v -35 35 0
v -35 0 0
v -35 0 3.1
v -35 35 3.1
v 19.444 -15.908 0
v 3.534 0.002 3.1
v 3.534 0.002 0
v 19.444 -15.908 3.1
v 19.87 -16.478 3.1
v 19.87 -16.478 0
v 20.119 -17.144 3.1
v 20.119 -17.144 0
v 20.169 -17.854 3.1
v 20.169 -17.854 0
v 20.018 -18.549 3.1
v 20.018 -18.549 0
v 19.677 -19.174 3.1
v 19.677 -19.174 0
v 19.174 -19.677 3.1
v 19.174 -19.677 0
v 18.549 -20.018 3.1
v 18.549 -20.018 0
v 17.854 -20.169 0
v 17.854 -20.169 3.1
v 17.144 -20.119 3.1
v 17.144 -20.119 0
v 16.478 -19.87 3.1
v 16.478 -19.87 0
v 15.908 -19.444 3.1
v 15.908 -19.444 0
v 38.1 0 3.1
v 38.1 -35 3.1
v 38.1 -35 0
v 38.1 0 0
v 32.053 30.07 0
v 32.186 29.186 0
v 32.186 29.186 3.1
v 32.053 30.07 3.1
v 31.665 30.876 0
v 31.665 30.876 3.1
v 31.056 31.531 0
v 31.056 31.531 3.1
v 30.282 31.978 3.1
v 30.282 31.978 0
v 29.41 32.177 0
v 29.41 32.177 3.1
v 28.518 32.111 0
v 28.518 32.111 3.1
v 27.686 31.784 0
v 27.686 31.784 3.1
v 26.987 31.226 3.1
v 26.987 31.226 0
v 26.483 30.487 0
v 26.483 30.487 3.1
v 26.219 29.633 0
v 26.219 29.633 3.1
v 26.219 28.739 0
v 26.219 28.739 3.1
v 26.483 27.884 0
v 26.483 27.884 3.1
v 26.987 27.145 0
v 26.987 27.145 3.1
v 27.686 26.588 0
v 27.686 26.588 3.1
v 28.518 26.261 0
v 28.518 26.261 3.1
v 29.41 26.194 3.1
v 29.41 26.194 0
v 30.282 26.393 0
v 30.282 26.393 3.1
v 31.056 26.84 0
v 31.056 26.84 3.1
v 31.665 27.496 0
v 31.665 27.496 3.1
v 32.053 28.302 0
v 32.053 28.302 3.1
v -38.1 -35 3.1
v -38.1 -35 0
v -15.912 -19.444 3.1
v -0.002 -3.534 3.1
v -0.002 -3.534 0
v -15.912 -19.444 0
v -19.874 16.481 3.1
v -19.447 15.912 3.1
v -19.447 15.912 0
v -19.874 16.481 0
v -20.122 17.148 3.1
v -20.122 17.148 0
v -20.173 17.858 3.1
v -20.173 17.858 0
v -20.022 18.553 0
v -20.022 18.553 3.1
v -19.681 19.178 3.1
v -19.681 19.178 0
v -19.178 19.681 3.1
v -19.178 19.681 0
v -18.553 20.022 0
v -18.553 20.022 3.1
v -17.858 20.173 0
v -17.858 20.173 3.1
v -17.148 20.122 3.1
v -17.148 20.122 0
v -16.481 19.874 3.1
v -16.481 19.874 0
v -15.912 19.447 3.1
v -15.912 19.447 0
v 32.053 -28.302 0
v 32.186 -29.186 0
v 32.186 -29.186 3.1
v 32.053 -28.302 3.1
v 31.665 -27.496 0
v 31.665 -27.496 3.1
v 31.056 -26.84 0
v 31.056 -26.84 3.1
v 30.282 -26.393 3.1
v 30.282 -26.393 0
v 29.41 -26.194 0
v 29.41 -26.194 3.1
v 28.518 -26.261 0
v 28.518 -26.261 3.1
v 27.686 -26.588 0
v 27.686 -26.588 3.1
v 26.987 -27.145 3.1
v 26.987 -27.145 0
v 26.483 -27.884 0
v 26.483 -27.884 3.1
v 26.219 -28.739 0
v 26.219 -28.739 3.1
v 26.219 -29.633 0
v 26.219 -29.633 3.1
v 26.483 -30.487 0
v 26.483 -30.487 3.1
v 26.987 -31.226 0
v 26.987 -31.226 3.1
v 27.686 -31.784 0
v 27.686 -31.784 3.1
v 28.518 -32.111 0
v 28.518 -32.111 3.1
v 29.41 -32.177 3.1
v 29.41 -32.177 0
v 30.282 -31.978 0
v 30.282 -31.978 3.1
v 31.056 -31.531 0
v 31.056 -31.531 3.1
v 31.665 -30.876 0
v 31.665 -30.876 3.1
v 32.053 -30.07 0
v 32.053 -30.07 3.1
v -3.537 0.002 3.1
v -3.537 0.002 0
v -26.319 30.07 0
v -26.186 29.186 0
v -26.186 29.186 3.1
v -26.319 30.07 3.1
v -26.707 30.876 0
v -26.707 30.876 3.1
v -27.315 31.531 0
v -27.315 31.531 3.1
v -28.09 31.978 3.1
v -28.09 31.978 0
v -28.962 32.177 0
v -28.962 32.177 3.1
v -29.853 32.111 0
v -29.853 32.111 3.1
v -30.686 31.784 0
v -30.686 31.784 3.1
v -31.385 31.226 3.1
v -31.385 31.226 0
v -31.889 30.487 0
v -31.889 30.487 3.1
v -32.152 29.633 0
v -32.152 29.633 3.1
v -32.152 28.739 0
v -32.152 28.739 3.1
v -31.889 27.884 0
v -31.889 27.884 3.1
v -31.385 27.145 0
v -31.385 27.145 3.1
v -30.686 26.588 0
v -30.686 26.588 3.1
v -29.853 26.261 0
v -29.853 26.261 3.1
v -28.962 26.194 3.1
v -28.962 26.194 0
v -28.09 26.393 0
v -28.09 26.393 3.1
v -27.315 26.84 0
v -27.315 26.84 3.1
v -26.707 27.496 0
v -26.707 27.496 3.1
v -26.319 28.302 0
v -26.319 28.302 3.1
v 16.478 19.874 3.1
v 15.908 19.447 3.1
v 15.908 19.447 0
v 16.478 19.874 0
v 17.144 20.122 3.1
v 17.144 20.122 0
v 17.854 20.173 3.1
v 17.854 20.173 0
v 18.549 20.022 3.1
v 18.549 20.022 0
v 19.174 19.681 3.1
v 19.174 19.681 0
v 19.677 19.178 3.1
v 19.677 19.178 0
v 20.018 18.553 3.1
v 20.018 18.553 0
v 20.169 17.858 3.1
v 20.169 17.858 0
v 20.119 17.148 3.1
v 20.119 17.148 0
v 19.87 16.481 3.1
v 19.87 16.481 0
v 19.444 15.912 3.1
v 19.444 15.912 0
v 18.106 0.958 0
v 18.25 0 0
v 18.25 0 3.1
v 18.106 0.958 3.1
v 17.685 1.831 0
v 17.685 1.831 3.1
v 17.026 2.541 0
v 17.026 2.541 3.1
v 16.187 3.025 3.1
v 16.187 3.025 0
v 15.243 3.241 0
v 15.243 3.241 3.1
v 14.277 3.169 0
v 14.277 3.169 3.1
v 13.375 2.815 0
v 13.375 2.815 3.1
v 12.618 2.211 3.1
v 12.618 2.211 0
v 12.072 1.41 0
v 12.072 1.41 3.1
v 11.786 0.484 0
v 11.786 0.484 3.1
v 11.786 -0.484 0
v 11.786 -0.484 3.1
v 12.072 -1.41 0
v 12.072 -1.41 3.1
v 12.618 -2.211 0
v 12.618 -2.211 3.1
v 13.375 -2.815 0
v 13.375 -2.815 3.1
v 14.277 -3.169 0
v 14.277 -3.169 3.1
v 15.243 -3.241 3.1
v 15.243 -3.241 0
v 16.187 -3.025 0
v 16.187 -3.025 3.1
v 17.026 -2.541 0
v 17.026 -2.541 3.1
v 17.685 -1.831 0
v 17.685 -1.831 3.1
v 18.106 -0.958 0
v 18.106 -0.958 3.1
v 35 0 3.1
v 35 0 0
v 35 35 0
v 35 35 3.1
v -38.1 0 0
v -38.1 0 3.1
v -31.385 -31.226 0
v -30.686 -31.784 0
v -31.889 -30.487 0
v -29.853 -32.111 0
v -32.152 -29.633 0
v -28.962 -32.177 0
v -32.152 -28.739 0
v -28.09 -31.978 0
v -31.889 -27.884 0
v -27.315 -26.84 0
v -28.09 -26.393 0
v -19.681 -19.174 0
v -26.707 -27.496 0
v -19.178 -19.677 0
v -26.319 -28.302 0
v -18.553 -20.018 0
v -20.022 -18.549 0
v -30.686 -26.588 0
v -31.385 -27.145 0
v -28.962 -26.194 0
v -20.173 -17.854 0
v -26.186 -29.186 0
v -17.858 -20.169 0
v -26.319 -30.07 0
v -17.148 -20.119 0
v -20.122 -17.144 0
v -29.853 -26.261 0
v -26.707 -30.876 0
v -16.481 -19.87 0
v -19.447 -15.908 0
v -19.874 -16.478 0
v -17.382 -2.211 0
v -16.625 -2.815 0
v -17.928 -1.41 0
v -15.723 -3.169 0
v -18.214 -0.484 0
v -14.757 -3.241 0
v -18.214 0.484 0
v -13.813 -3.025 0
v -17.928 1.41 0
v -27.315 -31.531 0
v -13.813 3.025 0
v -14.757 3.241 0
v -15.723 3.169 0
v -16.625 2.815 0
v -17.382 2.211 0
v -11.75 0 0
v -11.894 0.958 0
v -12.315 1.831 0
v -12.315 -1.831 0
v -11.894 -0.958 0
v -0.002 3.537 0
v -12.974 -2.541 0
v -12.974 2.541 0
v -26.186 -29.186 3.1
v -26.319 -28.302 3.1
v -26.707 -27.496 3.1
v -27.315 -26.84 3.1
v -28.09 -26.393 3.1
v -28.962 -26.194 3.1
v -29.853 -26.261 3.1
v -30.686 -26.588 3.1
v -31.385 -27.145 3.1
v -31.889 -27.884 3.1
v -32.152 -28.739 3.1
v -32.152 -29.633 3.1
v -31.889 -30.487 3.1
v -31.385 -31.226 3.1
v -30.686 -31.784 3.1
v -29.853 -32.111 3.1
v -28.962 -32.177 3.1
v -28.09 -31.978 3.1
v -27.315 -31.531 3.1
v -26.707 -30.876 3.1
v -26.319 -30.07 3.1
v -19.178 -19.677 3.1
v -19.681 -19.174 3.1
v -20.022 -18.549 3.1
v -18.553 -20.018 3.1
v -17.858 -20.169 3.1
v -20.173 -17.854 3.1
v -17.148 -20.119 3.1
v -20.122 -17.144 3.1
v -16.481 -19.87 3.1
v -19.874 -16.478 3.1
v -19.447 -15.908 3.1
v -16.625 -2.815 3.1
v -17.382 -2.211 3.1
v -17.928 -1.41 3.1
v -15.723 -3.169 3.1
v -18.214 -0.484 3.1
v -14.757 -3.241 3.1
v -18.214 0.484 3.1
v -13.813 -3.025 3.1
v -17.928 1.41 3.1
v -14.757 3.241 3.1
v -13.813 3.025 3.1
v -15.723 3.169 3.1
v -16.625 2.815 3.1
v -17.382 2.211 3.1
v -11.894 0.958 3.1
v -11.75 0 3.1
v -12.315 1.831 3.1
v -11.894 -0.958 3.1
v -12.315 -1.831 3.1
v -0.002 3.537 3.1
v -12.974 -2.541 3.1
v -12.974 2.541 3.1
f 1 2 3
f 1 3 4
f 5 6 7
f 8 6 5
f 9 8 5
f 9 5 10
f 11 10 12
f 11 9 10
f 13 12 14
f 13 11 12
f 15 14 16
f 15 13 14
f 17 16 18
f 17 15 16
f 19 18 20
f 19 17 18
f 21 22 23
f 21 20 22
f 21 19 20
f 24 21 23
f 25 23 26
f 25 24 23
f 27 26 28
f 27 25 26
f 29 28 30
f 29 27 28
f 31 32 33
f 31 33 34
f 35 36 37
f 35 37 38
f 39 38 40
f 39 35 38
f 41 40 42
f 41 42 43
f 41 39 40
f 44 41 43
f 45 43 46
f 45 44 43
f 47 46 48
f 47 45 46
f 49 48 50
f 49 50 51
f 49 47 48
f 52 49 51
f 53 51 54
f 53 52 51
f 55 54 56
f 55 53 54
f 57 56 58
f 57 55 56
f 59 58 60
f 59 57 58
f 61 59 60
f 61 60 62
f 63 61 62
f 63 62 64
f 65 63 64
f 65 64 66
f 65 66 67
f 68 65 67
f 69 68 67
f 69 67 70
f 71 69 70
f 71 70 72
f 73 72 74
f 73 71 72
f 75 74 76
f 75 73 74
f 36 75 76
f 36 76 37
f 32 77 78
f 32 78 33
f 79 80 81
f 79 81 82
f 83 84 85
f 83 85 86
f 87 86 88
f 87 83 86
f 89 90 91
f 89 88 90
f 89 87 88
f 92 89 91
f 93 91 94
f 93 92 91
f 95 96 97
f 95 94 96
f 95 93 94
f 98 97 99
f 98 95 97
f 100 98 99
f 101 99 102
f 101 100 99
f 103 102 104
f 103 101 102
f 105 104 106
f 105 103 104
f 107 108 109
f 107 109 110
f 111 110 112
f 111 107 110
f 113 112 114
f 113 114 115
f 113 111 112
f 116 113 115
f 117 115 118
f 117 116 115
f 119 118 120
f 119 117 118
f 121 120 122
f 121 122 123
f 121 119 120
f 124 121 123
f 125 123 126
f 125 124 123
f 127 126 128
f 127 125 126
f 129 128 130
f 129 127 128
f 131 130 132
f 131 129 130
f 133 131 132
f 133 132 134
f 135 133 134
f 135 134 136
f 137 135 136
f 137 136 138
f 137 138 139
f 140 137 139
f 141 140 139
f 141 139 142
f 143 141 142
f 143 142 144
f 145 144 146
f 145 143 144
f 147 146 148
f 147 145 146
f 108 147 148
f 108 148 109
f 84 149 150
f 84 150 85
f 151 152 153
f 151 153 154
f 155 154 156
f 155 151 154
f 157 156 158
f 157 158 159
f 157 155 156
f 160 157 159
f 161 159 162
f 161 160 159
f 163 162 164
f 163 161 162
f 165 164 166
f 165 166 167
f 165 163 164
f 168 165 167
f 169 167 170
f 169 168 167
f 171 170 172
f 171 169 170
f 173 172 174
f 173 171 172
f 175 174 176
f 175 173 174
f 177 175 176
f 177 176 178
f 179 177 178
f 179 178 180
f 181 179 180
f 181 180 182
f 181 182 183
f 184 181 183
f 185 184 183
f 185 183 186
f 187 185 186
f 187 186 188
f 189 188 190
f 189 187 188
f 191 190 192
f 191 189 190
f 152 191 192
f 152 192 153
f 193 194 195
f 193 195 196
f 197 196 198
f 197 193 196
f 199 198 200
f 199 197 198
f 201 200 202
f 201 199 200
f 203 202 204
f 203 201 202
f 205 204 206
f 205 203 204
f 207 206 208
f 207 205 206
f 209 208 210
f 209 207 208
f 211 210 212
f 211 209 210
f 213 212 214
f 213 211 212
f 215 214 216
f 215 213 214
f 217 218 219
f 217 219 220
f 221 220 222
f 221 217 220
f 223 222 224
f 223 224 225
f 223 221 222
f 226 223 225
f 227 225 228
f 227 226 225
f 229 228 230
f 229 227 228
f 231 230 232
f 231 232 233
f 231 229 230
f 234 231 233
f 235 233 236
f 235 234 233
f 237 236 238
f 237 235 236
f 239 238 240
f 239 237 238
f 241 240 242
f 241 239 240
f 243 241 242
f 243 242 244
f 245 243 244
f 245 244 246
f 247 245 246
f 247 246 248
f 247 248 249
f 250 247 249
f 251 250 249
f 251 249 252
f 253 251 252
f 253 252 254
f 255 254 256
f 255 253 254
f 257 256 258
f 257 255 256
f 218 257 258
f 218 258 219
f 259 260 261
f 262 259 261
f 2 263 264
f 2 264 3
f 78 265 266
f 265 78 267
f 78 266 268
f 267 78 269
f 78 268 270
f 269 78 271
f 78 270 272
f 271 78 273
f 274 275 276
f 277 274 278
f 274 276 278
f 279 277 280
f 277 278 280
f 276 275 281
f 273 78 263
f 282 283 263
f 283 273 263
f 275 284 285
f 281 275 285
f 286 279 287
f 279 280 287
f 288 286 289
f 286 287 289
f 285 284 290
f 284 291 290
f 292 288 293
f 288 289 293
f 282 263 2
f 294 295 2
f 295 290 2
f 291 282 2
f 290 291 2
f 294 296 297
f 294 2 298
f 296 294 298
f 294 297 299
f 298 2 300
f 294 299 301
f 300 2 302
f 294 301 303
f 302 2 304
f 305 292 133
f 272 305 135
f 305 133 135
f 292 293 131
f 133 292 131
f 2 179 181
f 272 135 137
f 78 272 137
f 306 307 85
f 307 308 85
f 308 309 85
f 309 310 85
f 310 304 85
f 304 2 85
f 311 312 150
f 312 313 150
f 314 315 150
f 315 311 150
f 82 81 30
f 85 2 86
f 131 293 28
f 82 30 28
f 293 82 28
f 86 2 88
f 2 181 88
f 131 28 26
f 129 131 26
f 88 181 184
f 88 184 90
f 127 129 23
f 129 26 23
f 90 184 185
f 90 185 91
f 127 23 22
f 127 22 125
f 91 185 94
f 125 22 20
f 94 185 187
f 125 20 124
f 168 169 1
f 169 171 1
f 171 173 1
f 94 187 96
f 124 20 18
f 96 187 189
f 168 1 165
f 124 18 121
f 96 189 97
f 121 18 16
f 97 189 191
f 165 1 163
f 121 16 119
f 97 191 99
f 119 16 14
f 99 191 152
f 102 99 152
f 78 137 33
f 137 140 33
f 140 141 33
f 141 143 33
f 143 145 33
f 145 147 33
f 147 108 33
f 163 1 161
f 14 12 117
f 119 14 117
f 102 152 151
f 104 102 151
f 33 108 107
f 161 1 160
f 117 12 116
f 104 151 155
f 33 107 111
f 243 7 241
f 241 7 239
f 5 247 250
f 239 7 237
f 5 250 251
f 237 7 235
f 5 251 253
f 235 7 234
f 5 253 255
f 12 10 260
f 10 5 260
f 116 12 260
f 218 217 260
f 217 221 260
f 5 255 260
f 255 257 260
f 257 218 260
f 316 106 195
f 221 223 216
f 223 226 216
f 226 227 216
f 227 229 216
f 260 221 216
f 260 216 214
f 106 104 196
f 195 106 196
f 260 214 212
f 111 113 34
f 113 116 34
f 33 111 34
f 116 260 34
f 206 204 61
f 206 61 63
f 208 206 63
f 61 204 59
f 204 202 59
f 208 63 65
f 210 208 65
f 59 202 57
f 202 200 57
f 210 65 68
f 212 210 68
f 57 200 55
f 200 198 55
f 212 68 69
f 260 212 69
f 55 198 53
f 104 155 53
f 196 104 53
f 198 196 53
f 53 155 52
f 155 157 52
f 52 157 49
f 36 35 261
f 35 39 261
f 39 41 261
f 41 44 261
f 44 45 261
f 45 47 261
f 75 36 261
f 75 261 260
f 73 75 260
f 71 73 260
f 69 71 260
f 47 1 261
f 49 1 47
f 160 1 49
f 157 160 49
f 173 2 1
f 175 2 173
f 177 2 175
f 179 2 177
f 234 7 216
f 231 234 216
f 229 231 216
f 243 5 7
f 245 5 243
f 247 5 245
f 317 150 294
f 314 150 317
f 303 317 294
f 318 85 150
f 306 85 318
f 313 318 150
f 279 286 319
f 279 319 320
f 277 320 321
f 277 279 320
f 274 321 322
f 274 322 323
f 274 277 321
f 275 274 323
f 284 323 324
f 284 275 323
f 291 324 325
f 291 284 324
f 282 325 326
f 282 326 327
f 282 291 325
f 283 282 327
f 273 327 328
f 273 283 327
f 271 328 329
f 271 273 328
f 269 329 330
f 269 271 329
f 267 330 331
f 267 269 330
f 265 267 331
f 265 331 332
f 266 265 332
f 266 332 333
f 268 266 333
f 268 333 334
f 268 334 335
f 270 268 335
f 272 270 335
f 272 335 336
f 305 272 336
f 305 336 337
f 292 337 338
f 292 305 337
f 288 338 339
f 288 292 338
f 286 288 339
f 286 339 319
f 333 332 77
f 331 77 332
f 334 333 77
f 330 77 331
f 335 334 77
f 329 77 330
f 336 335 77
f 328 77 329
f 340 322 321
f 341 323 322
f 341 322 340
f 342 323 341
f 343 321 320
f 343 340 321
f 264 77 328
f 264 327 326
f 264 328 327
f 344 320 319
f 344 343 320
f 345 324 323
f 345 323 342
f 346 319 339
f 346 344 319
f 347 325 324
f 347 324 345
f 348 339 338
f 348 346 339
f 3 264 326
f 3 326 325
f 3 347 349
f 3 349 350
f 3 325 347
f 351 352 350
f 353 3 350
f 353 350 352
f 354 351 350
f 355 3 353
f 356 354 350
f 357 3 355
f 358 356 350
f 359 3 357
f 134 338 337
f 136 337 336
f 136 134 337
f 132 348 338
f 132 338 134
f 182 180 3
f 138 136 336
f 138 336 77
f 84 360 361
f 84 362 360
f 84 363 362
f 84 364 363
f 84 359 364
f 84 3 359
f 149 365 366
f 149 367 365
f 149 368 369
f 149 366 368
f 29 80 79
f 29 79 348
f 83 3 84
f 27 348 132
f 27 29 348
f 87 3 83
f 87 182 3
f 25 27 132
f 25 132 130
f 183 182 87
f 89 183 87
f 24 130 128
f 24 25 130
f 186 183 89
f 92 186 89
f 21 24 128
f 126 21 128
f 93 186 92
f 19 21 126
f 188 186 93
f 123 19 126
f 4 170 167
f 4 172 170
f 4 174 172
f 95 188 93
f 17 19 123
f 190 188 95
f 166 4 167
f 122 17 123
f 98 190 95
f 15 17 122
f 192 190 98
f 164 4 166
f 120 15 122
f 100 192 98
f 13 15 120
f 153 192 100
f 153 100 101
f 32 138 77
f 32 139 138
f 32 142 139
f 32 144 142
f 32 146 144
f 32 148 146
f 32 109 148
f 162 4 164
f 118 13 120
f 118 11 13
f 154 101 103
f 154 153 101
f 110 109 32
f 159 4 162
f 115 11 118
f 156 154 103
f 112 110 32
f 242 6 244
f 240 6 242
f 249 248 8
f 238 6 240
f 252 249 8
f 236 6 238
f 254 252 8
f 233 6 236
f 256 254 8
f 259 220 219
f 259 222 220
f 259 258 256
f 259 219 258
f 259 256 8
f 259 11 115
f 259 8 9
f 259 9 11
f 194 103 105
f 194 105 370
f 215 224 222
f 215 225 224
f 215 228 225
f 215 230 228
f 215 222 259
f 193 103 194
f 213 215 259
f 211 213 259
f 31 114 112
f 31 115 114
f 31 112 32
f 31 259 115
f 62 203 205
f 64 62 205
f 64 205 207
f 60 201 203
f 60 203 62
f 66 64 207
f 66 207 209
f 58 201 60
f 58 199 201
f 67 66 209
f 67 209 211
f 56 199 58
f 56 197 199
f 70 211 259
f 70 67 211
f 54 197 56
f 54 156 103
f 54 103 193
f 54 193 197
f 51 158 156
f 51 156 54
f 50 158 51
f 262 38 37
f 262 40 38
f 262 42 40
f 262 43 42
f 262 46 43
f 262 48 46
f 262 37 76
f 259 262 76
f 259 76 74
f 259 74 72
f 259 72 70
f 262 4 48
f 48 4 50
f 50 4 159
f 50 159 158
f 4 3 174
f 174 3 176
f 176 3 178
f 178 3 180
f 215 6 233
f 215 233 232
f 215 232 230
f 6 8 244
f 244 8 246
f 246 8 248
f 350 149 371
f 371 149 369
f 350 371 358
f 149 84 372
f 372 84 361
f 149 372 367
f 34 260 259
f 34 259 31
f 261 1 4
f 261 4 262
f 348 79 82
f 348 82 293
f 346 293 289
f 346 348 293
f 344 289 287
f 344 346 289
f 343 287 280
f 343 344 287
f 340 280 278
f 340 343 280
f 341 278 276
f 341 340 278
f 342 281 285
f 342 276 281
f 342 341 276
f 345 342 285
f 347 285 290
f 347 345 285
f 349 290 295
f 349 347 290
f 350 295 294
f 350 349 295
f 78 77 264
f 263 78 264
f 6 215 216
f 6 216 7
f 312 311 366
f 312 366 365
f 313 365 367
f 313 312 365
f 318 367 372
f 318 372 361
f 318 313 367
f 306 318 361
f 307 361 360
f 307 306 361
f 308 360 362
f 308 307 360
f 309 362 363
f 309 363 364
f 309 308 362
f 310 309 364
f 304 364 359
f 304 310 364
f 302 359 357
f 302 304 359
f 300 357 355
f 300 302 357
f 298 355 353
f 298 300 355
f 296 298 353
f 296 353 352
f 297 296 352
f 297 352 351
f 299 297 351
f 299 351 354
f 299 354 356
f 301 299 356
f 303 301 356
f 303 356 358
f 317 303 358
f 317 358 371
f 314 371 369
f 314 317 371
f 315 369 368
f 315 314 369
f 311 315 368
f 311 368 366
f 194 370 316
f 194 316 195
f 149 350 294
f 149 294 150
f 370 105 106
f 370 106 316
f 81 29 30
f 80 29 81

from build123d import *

# Parameters (mm, degrees)
SKETCH1_W           = 70
SKETCH1_H           = 70
SKETCH1_R           = 3
SKETCH1_R_2         = 3.25
BOSS_EXTRUDE1_DEPTH = 3.1
SKETCH2_W           = 3.1
SKETCH2_H           = 35
BOSS_EXTRUDE2_DEPTH = 3.1
CUT_EXTRUDE1_DEPTH  = 4.1


with BuildPart() as part:
    # Sketch1 → Boss-Extrude1 (new body)
    with BuildSketch(Plane.XY):
        Rectangle(SKETCH1_W, SKETCH1_H)
        with Locations((-29.185832393, 29.185832393)):
            Circle(SKETCH1_R, mode=Mode.SUBTRACT)
        with Locations((29.185832393, 29.185832393)):
            Circle(SKETCH1_R, mode=Mode.SUBTRACT)
        with Locations((29.185832393, -29.185832393)):
            Circle(SKETCH1_R, mode=Mode.SUBTRACT)
        with Locations((-29.185832393, -29.185832393)):
            Circle(SKETCH1_R, mode=Mode.SUBTRACT)
        with Locations((15, 0)):
            Circle(SKETCH1_R_2, mode=Mode.SUBTRACT)
        with Locations((-15, 0)):
            Circle(SKETCH1_R_2, mode=Mode.SUBTRACT)
    extrude(amount=BOSS_EXTRUDE1_DEPTH)

    # Sketch2 → Boss-Extrude2 (add, through all)
    with BuildSketch(Plane.XY.offset(3.1)):
        with Locations((36.55, -17.5)):
            Rectangle(SKETCH2_W, SKETCH2_H)
        with Locations((-36.55, -17.5)):
            Rectangle(SKETCH2_W, SKETCH2_H)
    extrude(amount=-BOSS_EXTRUDE2_DEPTH)

    # Sketch3 → Cut-Extrude1 (cut, through all)
    with BuildSketch(Plane.XY.offset(3.1)):
        with BuildLine():
            Line((-15.911823751, 19.447357657), (-0.001921175, 3.537455081))
            Line((-0.001921175, 3.537455081), (15.907981402, 19.447357657))
            ThreePointArc((15.907981402, 19.447357657), (19.443515308, 19.447357657), (19.443515308, 15.911823751))
            Line((19.443515308, 15.911823751), (3.533612731, 0.001921175))
            Line((3.533612731, 0.001921175), (19.443515308, -15.907981402))
            ThreePointArc((19.443515308, -15.907981402), (19.443515308, -19.443515308), (15.907981402, -19.443515308))
            Line((15.907981402, -19.443515308), (-0.001921175, -3.533612731))
            Line((-0.001921175, -3.533612731), (-15.911823751, -19.443515308))
            ThreePointArc((-15.911823751, -19.443515308), (-19.447357657, -19.443515308), (-19.447357657, -15.907981402))
            Line((-19.447357657, -15.907981402), (-3.537455081, 0.001921175))
            Line((-3.537455081, 0.001921175), (-19.447357657, 15.911823751))
            ThreePointArc((-19.447357657, 15.911823751), (-19.447357657, 19.447357657), (-15.911823751, 19.447357657))
        make_face()
    extrude(amount=-CUT_EXTRUDE1_DEPTH, mode=Mode.SUBTRACT)


solid = part.part
